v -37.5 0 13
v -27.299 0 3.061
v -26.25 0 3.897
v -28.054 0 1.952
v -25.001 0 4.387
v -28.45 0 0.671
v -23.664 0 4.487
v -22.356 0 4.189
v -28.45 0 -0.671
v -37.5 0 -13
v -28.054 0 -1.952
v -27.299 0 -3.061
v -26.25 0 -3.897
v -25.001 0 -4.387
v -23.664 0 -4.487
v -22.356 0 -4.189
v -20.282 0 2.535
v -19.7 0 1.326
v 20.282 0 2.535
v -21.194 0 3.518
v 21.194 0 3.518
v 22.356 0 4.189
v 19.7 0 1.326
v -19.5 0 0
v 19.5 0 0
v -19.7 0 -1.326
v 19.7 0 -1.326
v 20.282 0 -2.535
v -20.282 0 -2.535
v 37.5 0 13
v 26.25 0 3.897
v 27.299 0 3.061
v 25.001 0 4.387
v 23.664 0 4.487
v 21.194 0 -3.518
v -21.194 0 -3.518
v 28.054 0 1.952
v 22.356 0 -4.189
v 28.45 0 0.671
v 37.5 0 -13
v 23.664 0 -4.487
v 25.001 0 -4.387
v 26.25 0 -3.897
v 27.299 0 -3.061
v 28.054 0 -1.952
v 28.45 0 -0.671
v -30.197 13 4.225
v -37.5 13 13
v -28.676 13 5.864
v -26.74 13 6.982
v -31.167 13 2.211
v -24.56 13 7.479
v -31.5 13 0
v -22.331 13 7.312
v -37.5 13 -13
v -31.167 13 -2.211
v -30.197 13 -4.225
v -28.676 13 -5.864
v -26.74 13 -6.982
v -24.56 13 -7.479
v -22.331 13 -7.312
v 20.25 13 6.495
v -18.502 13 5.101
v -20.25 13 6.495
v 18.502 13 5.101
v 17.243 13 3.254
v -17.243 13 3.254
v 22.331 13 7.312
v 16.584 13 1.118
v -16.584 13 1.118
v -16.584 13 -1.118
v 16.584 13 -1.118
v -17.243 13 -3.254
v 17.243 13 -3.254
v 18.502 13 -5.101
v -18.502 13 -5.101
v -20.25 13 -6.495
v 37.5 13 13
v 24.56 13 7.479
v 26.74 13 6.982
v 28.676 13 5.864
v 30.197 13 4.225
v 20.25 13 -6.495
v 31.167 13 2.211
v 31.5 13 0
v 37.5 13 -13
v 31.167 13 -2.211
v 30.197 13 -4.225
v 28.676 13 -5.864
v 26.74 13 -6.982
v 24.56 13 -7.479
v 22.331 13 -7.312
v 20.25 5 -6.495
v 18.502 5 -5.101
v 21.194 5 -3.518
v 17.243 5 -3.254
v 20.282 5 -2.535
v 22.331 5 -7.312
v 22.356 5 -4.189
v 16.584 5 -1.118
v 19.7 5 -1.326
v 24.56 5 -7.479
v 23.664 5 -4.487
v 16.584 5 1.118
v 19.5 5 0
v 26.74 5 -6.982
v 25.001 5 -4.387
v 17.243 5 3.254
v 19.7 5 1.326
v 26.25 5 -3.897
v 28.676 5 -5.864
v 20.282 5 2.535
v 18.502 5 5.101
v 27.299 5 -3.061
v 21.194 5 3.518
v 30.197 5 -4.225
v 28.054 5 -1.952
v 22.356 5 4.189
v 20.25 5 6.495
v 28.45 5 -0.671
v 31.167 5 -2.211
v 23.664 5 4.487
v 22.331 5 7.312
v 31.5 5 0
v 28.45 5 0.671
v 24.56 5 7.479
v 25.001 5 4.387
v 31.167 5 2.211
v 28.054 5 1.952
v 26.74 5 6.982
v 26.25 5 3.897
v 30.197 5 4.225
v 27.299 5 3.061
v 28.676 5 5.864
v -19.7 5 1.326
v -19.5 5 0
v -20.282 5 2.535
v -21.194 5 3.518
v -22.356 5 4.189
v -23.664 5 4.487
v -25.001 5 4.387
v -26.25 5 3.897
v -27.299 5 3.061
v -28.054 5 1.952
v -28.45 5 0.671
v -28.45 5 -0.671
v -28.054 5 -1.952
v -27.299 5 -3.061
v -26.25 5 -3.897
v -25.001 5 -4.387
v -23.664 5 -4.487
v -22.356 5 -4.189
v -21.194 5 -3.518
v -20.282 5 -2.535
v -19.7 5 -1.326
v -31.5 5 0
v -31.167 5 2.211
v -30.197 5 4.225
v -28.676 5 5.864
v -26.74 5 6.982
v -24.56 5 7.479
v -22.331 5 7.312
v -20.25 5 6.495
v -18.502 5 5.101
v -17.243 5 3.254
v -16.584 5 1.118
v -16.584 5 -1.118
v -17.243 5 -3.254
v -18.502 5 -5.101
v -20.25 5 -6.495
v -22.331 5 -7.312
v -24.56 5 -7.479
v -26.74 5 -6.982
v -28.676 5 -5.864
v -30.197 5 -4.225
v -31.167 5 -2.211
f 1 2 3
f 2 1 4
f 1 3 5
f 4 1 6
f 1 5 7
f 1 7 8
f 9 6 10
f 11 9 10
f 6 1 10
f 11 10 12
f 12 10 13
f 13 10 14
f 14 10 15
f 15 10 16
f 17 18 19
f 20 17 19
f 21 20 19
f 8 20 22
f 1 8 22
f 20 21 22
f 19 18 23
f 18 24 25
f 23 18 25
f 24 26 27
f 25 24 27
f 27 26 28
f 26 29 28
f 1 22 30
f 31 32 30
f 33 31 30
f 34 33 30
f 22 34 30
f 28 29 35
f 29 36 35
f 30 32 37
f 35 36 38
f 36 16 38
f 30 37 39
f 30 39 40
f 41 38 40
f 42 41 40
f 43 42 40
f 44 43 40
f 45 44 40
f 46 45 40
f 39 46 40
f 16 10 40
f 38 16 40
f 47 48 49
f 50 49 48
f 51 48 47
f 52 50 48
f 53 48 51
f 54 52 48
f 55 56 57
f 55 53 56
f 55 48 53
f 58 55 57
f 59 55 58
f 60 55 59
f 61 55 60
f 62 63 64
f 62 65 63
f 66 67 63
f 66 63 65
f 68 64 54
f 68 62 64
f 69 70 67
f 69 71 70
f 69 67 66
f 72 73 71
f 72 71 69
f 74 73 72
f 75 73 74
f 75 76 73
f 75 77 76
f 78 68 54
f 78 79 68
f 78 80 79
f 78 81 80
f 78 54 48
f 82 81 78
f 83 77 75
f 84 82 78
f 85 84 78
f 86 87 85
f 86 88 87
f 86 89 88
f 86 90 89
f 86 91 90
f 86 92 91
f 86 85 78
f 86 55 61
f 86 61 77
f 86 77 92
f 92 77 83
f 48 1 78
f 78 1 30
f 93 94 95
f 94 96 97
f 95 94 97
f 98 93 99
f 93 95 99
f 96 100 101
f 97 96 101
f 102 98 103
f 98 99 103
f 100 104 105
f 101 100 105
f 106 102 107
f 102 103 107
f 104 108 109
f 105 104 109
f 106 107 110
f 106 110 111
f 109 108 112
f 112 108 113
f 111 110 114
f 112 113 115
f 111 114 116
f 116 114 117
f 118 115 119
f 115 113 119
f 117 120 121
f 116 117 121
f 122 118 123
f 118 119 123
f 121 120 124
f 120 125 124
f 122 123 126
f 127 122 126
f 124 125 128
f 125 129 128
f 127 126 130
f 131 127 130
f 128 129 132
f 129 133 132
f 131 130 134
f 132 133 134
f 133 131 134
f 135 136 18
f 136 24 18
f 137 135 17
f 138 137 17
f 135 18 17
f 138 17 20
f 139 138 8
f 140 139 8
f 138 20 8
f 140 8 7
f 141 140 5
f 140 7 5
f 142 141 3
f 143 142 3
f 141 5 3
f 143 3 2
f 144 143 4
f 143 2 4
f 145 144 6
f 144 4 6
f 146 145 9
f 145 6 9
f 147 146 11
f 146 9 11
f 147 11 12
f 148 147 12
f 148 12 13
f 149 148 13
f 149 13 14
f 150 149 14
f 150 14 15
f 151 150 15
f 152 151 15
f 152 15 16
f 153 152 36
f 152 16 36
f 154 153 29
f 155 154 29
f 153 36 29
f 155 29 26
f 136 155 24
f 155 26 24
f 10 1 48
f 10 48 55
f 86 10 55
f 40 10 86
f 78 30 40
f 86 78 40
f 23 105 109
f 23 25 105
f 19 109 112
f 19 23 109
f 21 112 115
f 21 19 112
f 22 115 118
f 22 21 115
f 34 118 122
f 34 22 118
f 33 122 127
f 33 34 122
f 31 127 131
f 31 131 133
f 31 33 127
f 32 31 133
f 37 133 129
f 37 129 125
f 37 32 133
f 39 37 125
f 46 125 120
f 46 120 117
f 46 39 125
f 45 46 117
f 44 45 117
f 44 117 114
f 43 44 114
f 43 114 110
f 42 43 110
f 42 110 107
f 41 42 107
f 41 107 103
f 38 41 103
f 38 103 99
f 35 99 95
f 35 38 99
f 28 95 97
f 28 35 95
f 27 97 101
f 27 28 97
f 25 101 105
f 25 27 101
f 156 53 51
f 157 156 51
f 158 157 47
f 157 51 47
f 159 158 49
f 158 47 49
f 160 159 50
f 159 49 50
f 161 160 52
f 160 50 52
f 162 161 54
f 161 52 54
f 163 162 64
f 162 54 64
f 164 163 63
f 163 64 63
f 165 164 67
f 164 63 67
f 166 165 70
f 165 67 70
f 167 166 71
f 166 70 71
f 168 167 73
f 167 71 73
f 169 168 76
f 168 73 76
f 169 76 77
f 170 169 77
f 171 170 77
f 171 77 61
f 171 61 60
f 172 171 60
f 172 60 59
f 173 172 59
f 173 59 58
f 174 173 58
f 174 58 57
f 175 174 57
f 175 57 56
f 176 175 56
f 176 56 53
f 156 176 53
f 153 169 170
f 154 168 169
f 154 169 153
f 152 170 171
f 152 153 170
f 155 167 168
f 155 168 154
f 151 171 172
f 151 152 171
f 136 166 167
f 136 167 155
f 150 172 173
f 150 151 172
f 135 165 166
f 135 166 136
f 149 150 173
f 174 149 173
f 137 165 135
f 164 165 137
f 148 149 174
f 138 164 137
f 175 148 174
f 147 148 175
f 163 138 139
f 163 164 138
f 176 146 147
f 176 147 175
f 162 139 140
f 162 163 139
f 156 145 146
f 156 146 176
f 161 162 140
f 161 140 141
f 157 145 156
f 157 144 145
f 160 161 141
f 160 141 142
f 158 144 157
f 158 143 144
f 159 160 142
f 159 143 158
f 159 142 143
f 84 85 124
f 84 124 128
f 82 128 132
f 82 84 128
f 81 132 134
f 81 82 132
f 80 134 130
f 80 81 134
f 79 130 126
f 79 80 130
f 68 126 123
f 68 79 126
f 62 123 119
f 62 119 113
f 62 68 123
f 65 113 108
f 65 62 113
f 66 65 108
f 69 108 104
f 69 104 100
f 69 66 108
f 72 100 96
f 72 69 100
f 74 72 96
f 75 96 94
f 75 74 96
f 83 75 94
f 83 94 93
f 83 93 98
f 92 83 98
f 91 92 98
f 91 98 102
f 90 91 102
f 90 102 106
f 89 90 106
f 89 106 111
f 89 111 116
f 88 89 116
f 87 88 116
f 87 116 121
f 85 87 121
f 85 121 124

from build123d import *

# Parameters (mm, degrees)
SKETCH1_W                      = 75
SKETCH1_H                      = 26
EXTRUDE1_DEPTH                 = 13
CBORE_FOR_M8_SHCS1_D           = 9
CBORE_FOR_M8_SHCS1_CBORE_D     = 15
CBORE_FOR_M8_SHCS1_CBORE_DEPTH = 8


with BuildPart() as part:
    # Sketch1 → Extrude1 (new body)
    with BuildSketch(Plane(origin=(0, 0, 0), x_dir=(1, 0, 0), z_dir=(0, 1, 0))):
        Rectangle(SKETCH1_W, SKETCH1_H)
    extrude(amount=EXTRUDE1_DEPTH)

    # CBORE for M8 SHCS1 (through all)
    with Locations(Plane(origin=(0, 13, 0), x_dir=(-1, 0, 0), z_dir=(0, 1, 0))):
        with Locations((24, 0)):
            cbore_for_m8_shcs1 = CounterBoreHole(CBORE_FOR_M8_SHCS1_D / 2, CBORE_FOR_M8_SHCS1_CBORE_D / 2, CBORE_FOR_M8_SHCS1_CBORE_DEPTH)

    # Mirror1: CBORE for M8 SHCS1 across plane
    add(cbore_for_m8_shcs1.mirror(Plane(origin=(0, 0, 0), x_dir=(0, 0, 1), z_dir=(1, 0, 0))), mode=Mode.SUBTRACT)


solid = part.part
